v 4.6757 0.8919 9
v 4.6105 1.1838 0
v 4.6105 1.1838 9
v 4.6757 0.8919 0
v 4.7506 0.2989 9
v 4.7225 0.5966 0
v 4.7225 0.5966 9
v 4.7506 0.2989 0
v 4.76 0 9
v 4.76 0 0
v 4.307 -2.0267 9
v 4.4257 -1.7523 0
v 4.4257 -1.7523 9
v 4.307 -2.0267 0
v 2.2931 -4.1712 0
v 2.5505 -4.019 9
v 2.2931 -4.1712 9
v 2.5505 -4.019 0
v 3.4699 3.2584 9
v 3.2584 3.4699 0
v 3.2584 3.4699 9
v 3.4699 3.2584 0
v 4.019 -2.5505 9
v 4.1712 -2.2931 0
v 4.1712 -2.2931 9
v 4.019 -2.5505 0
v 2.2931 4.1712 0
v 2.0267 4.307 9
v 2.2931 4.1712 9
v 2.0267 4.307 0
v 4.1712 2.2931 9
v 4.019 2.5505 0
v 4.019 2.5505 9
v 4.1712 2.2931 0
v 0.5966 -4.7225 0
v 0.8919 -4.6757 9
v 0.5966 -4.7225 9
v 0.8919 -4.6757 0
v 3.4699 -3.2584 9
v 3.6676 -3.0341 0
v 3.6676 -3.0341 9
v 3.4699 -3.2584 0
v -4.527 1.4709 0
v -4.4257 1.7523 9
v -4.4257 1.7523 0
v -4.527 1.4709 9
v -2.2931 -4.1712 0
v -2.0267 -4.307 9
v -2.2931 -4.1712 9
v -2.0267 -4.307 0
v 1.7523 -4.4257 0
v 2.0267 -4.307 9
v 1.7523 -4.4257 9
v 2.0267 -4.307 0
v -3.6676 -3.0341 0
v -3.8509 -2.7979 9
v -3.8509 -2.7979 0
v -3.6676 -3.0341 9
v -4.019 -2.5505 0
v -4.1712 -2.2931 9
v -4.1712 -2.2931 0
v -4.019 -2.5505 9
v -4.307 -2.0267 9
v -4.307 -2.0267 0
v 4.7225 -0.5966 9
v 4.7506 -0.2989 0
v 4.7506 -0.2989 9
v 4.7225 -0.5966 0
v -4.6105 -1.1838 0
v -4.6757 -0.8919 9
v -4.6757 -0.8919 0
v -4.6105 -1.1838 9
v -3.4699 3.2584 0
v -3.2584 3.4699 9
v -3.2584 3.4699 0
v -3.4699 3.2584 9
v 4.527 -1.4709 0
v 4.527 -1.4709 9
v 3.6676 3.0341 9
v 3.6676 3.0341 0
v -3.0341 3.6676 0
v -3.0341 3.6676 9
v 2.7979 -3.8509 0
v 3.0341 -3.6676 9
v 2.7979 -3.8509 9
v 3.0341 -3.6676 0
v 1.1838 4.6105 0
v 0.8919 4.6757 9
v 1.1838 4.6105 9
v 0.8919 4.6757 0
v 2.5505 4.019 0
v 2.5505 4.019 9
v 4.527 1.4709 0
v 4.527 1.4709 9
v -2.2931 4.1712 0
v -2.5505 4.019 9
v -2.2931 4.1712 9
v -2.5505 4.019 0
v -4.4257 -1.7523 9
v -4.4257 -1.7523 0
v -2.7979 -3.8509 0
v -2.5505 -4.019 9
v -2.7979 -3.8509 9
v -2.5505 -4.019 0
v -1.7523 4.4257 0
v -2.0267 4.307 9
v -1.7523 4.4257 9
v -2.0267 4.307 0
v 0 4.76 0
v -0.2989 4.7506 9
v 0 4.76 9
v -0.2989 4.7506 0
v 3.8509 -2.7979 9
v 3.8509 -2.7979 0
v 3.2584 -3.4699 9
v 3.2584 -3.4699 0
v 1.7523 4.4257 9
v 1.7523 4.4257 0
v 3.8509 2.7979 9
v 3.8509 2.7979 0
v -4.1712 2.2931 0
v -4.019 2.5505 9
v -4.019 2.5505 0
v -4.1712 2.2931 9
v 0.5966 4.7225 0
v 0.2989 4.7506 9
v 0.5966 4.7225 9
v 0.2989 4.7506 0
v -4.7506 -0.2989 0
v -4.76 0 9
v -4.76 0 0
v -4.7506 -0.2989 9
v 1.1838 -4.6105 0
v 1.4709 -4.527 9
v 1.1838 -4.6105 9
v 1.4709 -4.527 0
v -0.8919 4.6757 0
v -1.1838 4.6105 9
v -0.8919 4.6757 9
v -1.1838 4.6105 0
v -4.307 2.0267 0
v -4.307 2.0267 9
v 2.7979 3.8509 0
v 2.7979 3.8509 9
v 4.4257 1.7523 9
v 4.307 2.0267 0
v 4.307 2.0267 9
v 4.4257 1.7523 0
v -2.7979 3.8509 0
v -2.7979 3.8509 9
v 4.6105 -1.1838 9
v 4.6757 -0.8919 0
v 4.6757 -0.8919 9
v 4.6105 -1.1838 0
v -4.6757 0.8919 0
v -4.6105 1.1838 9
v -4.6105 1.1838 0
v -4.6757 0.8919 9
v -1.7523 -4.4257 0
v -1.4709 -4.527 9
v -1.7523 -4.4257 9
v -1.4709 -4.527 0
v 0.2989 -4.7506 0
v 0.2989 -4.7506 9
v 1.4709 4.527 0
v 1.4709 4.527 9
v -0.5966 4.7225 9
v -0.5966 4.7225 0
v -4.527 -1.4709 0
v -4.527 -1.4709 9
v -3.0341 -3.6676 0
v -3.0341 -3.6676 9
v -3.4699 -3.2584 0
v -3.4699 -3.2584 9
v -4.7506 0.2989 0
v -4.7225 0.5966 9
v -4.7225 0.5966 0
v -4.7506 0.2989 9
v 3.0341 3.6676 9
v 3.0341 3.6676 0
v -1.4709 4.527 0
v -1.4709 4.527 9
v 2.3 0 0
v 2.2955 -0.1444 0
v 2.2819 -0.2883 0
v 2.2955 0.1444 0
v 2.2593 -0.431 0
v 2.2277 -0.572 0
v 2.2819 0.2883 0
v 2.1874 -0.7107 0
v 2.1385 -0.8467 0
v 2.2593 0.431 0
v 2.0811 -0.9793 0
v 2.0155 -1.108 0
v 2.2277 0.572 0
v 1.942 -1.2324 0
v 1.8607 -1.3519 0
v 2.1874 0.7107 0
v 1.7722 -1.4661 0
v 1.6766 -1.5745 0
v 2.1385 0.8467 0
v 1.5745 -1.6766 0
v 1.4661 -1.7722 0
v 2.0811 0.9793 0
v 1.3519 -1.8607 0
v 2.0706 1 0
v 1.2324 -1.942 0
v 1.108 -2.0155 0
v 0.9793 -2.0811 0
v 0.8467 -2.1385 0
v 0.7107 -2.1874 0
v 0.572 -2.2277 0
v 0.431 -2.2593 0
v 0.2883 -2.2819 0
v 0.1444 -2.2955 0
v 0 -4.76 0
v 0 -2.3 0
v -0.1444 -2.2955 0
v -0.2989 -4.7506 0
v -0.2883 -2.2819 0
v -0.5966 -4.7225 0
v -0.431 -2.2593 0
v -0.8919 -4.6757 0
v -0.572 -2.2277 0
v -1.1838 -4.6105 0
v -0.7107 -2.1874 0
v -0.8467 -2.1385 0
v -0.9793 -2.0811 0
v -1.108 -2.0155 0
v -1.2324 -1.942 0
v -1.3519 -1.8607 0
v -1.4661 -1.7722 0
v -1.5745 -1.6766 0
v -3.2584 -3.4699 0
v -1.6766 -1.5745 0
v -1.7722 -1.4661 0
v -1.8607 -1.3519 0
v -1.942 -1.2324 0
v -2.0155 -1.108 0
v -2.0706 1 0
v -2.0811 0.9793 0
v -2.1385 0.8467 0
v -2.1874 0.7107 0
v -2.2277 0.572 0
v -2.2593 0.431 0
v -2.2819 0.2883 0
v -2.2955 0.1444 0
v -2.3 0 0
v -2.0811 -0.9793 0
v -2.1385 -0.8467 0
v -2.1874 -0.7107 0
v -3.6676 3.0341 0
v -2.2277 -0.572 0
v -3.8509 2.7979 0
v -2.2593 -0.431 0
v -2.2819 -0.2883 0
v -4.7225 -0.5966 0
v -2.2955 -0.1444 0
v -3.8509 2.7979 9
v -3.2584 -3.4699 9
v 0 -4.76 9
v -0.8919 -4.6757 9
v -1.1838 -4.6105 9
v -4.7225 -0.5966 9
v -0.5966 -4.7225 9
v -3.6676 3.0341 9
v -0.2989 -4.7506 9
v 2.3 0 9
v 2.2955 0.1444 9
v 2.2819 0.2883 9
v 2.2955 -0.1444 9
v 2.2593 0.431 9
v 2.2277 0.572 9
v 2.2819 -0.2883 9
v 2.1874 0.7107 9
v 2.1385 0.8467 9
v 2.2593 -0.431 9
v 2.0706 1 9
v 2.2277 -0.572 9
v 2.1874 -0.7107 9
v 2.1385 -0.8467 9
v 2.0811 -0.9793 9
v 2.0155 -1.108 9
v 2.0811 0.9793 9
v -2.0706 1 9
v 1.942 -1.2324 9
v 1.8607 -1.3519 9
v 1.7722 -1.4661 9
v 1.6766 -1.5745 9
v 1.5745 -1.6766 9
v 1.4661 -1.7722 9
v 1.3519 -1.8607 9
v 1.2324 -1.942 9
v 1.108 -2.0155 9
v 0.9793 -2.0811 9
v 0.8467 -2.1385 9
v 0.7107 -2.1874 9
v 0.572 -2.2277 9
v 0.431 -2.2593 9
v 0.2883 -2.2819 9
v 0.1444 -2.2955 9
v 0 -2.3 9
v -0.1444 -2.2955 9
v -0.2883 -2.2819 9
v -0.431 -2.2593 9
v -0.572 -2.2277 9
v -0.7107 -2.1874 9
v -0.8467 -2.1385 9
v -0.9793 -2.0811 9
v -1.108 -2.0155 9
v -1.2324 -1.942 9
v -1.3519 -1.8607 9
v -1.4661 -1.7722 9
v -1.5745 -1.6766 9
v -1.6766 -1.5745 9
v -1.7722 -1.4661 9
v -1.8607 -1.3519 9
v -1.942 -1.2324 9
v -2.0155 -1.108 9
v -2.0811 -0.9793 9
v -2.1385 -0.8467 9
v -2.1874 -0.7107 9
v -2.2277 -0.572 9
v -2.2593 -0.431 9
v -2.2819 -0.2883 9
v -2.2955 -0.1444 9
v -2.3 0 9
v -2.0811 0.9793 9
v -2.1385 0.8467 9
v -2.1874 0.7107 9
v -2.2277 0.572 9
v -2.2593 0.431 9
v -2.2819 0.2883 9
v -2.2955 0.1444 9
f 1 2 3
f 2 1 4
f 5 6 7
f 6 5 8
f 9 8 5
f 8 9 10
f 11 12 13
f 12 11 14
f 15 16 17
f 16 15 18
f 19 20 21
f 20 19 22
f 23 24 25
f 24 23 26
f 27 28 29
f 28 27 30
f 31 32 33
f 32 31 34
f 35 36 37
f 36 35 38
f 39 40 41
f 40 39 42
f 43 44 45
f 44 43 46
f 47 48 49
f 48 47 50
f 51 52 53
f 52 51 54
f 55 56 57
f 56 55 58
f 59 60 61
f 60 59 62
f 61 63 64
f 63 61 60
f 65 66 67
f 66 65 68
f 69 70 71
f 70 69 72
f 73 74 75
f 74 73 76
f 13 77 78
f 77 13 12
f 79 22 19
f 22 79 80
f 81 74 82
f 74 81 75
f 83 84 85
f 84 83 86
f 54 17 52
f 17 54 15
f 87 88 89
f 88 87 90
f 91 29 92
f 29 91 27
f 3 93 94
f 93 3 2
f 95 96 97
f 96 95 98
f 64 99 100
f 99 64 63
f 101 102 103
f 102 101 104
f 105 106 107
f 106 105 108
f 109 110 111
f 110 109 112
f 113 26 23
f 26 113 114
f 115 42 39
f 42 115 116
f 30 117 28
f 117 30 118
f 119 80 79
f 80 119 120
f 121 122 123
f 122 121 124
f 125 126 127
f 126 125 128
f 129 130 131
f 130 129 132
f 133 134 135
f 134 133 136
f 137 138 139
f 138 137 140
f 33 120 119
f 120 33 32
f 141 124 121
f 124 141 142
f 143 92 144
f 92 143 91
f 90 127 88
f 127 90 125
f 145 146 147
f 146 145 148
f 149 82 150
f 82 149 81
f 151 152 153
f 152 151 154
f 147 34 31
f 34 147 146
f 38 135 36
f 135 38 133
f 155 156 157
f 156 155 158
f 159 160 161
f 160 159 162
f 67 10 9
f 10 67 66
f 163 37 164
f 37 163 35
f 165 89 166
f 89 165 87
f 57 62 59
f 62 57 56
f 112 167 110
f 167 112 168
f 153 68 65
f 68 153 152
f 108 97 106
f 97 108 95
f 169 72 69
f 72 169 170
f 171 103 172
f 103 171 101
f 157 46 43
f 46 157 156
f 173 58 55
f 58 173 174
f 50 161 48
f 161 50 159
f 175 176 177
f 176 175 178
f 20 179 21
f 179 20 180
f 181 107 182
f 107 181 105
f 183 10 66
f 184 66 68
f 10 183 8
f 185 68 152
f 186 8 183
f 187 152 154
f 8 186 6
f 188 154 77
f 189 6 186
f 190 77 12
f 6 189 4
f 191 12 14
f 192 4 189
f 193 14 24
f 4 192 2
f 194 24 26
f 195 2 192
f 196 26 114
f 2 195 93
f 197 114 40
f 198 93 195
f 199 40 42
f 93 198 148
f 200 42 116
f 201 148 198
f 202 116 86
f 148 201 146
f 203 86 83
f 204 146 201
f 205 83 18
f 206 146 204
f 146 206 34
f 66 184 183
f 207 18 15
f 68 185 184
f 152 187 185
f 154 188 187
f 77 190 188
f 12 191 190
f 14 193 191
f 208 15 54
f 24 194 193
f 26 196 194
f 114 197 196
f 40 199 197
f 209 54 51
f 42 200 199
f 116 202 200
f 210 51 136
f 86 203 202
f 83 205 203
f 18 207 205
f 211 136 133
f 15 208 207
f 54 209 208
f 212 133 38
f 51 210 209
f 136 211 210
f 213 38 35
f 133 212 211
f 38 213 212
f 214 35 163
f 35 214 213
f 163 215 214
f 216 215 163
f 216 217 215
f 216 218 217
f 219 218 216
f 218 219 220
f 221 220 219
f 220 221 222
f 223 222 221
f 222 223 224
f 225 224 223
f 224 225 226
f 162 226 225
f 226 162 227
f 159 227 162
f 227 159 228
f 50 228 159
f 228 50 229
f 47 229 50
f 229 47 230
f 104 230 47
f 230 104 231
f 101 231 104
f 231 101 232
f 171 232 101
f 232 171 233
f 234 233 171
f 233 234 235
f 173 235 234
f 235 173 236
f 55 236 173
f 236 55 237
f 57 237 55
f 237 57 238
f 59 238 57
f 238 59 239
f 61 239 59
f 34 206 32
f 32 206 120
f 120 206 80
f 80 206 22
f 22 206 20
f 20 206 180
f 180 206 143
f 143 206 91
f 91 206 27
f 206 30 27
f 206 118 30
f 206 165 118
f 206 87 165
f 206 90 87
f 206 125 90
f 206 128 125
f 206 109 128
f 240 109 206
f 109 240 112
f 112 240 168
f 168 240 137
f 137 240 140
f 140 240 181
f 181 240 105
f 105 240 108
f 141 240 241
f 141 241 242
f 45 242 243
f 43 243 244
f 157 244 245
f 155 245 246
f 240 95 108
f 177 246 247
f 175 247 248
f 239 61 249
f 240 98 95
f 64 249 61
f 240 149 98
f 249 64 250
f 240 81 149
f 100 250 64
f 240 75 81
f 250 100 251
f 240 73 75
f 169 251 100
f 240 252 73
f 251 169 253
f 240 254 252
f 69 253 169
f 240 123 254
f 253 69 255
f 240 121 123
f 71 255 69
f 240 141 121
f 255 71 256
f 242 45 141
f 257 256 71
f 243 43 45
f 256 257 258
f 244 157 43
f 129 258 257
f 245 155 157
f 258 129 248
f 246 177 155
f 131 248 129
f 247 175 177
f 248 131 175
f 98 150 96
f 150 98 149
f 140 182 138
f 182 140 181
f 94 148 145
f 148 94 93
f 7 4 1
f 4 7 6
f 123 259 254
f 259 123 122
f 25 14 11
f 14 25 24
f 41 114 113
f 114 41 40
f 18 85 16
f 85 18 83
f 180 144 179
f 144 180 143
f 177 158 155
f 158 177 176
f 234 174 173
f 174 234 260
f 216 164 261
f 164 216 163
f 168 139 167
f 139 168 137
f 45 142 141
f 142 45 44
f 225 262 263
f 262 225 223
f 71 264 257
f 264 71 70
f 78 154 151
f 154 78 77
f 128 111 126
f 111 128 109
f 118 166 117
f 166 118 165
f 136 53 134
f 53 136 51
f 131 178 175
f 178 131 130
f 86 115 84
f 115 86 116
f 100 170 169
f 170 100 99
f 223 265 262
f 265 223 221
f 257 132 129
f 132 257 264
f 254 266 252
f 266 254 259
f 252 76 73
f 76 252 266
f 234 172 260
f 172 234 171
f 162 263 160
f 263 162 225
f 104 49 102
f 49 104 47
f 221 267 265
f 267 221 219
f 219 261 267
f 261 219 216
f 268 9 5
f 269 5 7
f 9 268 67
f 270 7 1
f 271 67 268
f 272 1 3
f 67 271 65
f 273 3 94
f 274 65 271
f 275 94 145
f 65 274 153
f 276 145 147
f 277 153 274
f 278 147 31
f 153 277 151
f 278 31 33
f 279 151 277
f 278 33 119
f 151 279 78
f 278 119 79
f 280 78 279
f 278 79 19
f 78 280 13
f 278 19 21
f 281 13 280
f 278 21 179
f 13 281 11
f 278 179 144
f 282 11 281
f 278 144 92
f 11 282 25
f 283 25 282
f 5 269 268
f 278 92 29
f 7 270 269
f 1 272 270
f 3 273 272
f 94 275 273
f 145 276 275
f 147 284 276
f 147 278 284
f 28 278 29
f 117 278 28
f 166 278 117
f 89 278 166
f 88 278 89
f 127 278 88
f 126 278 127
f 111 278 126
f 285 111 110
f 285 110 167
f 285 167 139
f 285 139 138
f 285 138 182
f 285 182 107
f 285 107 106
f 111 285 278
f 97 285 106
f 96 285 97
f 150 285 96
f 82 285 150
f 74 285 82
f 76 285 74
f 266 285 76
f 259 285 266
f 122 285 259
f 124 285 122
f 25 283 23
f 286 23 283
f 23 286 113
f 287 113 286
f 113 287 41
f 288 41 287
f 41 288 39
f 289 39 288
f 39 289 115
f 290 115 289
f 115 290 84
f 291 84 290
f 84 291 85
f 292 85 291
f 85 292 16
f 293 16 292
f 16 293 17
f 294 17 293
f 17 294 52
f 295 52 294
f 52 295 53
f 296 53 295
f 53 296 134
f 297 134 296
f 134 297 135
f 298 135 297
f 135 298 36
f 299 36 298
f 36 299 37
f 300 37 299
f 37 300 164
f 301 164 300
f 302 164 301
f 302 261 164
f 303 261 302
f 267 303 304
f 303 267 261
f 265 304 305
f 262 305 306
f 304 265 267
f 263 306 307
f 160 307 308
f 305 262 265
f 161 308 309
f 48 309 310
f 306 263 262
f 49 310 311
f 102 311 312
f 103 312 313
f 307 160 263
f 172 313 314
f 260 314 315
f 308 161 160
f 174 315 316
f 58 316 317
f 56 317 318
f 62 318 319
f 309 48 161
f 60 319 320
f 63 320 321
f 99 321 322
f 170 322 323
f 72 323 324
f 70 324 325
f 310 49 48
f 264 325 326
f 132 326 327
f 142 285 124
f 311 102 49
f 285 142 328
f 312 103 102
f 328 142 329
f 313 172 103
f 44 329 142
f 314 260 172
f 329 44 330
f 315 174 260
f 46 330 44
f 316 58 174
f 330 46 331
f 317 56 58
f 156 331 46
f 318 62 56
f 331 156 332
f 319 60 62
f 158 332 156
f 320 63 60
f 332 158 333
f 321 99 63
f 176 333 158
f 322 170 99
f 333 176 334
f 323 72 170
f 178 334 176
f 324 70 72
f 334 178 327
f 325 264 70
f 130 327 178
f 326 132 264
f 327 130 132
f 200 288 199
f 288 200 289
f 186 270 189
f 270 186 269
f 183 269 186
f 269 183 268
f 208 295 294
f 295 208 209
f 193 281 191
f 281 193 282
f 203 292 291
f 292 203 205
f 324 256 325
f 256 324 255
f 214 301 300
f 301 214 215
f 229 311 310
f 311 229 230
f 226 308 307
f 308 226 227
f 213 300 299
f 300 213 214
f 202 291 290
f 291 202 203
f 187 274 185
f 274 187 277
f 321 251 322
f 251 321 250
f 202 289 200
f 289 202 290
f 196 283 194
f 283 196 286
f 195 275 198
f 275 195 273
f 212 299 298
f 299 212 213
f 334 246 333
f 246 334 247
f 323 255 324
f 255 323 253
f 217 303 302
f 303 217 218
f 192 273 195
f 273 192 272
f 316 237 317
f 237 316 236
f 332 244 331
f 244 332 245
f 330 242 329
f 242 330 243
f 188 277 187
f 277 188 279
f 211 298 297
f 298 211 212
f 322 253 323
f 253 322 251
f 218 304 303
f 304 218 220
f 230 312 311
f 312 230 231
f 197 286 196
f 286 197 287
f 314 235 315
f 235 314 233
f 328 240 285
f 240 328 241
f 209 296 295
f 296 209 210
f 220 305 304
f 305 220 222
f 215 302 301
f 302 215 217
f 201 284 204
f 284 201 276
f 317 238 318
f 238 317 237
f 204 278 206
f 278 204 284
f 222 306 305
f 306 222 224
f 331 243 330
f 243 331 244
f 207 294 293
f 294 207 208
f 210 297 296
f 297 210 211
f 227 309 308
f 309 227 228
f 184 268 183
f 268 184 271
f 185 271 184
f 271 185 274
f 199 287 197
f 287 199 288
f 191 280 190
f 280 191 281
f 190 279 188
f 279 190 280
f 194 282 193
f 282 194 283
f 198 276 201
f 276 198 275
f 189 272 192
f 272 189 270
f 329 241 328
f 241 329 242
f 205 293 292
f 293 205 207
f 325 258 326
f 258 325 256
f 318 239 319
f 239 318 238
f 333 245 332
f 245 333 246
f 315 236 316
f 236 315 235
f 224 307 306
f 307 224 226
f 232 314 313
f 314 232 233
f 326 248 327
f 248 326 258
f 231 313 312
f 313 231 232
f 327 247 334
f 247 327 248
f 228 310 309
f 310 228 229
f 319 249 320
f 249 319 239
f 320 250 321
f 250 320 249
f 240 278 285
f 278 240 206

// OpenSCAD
nut_height = 6;
nut_radius = 5.95; // 6 was slightly too big
edge_length = tan(30) * nut_radius;

hole_radius = 2.3;
hole_cutoff = 1.3; // 1.5 fits on one axis, too tight on others. 

difference() {
	union() {
		linear_extrude( height=nut_height ) {	
			for(i = [0:6]) {
			 	rotate([0,0, i*60]) polygon([[0,0], [nut_radius, -edge_length], [nut_radius, edge_length]]);
			}
		}
		cylinder(h=nut_height*1.5, r=nut_radius*0.8, $fn=100);
	}
	difference() {
		translate([0,0,-1]) cylinder(h=nut_height*2, r=hole_radius, $fn=100);
		translate([-hole_radius, hole_radius-hole_cutoff, 0]) cube([2*hole_radius, 2*hole_radius, nut_height*2]);
	}
}
